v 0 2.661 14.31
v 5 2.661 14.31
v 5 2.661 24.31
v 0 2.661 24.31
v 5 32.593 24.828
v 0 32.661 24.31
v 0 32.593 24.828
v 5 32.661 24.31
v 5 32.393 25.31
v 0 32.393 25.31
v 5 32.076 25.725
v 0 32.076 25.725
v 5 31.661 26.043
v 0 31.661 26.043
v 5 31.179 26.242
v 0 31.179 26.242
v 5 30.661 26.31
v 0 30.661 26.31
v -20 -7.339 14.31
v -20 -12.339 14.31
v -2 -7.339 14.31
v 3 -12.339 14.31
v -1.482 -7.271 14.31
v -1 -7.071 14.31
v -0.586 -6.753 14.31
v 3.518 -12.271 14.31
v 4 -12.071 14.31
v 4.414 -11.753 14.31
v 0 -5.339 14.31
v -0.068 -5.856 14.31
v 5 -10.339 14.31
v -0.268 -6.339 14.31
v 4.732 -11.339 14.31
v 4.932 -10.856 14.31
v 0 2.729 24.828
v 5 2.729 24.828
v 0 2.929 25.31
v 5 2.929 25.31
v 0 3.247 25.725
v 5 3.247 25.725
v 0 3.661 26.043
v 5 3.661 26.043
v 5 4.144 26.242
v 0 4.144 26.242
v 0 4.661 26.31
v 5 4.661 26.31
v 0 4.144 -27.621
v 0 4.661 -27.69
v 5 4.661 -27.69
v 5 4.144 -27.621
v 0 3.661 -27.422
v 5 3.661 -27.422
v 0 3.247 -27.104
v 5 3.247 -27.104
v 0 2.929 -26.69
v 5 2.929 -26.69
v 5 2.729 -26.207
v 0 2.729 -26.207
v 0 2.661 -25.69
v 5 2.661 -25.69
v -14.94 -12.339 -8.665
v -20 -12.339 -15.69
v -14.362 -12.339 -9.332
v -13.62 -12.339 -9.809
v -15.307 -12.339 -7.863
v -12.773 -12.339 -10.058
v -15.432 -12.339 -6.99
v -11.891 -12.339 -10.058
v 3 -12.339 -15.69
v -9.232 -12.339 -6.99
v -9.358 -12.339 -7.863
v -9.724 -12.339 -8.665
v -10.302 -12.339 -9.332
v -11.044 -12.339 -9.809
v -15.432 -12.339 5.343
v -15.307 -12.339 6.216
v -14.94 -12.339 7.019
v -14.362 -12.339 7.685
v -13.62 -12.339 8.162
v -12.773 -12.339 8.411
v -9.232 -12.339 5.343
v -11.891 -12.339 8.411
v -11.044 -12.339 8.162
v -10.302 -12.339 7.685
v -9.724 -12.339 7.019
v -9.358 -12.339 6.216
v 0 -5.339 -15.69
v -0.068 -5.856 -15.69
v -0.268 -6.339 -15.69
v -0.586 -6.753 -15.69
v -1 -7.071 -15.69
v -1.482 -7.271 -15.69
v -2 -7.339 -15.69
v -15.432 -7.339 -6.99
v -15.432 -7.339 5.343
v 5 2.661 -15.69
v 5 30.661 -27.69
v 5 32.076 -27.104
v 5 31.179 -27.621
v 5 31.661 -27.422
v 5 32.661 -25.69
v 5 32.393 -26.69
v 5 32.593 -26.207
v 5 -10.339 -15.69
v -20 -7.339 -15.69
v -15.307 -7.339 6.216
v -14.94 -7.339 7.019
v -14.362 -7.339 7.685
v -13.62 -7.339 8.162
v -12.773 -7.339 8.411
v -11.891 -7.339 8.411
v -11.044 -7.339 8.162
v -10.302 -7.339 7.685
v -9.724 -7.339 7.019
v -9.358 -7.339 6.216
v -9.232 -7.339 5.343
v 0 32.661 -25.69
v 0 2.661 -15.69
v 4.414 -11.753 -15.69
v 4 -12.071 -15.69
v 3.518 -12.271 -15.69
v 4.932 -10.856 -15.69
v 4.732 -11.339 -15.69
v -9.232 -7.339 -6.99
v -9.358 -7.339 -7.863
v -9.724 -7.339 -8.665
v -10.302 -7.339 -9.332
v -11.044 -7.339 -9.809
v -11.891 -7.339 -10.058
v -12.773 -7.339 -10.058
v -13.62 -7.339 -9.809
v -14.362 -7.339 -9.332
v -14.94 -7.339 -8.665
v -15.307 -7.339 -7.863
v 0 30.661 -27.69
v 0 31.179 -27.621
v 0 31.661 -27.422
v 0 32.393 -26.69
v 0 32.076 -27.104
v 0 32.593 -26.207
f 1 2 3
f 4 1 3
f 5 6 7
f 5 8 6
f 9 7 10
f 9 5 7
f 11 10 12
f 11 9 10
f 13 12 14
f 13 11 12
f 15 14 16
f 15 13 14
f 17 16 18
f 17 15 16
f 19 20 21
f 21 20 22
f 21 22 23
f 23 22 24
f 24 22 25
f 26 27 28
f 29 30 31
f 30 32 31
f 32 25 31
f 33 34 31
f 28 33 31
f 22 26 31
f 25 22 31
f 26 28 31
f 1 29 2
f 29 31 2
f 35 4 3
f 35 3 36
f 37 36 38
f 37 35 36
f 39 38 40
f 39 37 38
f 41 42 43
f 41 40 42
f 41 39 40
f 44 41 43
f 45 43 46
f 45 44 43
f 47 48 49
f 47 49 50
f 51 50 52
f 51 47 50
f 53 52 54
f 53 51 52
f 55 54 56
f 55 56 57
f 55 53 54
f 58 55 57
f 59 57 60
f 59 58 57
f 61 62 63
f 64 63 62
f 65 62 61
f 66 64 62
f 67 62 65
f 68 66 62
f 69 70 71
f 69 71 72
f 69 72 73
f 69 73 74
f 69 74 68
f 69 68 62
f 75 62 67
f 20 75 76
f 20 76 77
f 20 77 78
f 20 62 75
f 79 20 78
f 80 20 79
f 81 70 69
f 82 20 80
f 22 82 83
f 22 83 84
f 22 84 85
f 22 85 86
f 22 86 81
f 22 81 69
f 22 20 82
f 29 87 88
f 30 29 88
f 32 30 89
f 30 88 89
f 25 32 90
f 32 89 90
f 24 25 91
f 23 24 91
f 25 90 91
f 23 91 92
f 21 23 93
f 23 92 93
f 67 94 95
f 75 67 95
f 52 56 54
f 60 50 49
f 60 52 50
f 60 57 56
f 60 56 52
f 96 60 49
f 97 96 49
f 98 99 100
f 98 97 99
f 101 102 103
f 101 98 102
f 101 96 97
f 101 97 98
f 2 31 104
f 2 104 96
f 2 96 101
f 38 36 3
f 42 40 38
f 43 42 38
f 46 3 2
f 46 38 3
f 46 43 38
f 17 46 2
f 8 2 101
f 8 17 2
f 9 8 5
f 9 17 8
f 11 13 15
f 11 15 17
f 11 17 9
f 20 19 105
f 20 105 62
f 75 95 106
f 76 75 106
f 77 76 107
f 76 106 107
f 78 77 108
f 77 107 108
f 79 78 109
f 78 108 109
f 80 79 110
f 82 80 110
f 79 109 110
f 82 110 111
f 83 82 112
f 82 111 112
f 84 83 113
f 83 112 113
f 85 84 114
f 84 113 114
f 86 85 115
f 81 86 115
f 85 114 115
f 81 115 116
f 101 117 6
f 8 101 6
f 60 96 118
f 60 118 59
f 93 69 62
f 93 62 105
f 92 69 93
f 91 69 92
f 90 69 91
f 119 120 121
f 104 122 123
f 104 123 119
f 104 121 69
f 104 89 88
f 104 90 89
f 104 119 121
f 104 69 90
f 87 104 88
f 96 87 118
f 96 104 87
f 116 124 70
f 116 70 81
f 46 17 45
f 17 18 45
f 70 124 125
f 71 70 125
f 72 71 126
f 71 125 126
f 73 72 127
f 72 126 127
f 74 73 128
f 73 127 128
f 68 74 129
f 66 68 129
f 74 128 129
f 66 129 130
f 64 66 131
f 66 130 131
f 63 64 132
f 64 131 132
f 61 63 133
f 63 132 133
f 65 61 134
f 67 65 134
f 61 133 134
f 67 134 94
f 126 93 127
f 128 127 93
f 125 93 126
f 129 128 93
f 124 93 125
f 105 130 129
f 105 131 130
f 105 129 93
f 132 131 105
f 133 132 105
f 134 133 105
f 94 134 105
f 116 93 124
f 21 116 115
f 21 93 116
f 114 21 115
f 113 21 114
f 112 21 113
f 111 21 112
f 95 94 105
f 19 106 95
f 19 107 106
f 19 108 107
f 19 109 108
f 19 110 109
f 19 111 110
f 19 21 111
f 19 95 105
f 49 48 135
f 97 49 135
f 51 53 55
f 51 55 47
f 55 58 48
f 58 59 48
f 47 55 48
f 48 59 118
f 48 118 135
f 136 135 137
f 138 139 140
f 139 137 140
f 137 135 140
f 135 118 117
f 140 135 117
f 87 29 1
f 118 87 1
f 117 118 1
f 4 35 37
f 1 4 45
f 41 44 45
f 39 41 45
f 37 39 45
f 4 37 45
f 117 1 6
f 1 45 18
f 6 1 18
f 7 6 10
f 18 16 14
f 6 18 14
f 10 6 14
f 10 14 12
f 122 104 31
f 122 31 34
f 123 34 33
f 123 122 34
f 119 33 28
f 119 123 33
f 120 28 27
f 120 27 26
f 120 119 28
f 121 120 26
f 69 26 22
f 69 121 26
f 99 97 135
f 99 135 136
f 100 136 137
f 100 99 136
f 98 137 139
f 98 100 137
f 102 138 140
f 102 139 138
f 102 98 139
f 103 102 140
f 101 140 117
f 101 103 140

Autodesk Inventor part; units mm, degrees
ref_plane "YZ Plane" through (0, 0, 0) normal (1, 0, 0) x (0, 1, 0)
ref_plane "XZ Plane" through (0, 0, 0) normal (0, 1, 0) x (-1, 0, 0)
ref_plane "XY Plane" through (0, 0, 0) normal (0, 0, 1) x (1, 0, 0)
sketch "Sketch1" plane through (0, 0, 0) normal (1, 0, 0) x (0, 1, 0)
  line L0 (32.6613, 26.3105) -> (-7.3387, 26.3105)
  line L1 (-7.3387, 26.3105) -> (-7.3387, -27.6895)
  line L2 (-7.3387, -27.6895) -> (32.6613, -27.6895)
  line L3 (32.6613, -27.6895) -> (32.6613, 26.3105)
  point P0 (0, 0)
  dimension "d0" = 40
  dimension "d1" = 54
extrude "Extrusion1" add sketch "Sketch1" along normal blind 5
sketch "Sketch2" plane through (0, -7.3387, 26.3105) normal (0, 0, 1) x (1, 0, 0)
  line L0 (5, 0) -> (-20, 0)
  line L1 (-20, 0) -> (-20, -5)
  line L2 (-20, -5) -> (5, -5)
  line L3 (5, -5) -> (5, 0)
  point P0 (0, 7.3387)
  dimension "d4" = 5
  dimension "d5" = 25
extrude "Extrusion2" add sketch "Sketch2" against normal blind 54
sketch "Sketch3" plane through (5, 0, 0) normal (1, 0, 0) x (0, 0, -1)
  line L0 (-26.3105, 32.6613) -> (-26.3105, -12.3387) projected
  line L1 (-26.3105, -12.3387) -> (-14.3105, -12.3387)
  line L2 (-14.3105, -12.3387) -> (-14.3105, 2.6613)
  line L3 (-14.3105, 2.6613) -> (-26.3105, 2.6613)
  line L4 (-26.3105, 2.6613) -> (-26.3105, -12.3387)
  line L5 (-26.3105, -12.3387) -> (27.6895, -12.3387) projected
  line L6 (27.6895, -12.3387) -> (15.6895, -12.3387)
  line L7 (15.6895, -12.3387) -> (15.6895, 2.6613)
  line L8 (15.6895, 2.6613) -> (27.6895, 2.6613)
  line L9 (27.6895, 2.6613) -> (27.6895, -12.3387)
  point P0 (0, 0)
  point P1 (15.6895, -12.3387)
  dimension "d8" = 12
  dimension "d9" = 12
  dimension "d10" = 15
  dimension "d11" = 15
extrude "Extrusion3" cut sketch "Sketch3" against normal through all
fillet "Fillet1" radius 2 4 edges at (2.5, 2.6613, 26.3105) (2.5, 2.6613, -27.6895) (2.5, 32.6613, -27.6895) (2.5, 32.6613, 26.3105)
fillet "Fillet2" radius 2 1 edges at (0, -7.3387, -0.6895)
sketch "Sketch4" plane through (-20, -7.3387, 14.3105) normal (0, 1, 0) x (1, 0, 0)
  arc A0 (10.7679, 21.3) -> (4.5679, 21.3) centre (7.6679, 21.3) ccw
  arc A1 (4.5679, 8.9679) -> (10.7679, 8.9679) centre (7.6679, 8.9679) ccw
  line L0 (10.7679, 21.3) -> (10.7679, 8.9679)
  line L1 (4.5679, 21.3) -> (4.5679, 8.9679)
  line L2 (18, 30) -> (0, 30) projected
  point P0 (20, 14.3105)
  dimension "d16" = 6.2
  dimension "d17" = 6.2
  dimension "d18" = 8.7
extrude "Extrusion4" cut sketch "Sketch4" against normal through all
fillet "Fillet3" radius 2 1 edges at (5, -12.3387, -0.6895)
properties part number "end plate"
